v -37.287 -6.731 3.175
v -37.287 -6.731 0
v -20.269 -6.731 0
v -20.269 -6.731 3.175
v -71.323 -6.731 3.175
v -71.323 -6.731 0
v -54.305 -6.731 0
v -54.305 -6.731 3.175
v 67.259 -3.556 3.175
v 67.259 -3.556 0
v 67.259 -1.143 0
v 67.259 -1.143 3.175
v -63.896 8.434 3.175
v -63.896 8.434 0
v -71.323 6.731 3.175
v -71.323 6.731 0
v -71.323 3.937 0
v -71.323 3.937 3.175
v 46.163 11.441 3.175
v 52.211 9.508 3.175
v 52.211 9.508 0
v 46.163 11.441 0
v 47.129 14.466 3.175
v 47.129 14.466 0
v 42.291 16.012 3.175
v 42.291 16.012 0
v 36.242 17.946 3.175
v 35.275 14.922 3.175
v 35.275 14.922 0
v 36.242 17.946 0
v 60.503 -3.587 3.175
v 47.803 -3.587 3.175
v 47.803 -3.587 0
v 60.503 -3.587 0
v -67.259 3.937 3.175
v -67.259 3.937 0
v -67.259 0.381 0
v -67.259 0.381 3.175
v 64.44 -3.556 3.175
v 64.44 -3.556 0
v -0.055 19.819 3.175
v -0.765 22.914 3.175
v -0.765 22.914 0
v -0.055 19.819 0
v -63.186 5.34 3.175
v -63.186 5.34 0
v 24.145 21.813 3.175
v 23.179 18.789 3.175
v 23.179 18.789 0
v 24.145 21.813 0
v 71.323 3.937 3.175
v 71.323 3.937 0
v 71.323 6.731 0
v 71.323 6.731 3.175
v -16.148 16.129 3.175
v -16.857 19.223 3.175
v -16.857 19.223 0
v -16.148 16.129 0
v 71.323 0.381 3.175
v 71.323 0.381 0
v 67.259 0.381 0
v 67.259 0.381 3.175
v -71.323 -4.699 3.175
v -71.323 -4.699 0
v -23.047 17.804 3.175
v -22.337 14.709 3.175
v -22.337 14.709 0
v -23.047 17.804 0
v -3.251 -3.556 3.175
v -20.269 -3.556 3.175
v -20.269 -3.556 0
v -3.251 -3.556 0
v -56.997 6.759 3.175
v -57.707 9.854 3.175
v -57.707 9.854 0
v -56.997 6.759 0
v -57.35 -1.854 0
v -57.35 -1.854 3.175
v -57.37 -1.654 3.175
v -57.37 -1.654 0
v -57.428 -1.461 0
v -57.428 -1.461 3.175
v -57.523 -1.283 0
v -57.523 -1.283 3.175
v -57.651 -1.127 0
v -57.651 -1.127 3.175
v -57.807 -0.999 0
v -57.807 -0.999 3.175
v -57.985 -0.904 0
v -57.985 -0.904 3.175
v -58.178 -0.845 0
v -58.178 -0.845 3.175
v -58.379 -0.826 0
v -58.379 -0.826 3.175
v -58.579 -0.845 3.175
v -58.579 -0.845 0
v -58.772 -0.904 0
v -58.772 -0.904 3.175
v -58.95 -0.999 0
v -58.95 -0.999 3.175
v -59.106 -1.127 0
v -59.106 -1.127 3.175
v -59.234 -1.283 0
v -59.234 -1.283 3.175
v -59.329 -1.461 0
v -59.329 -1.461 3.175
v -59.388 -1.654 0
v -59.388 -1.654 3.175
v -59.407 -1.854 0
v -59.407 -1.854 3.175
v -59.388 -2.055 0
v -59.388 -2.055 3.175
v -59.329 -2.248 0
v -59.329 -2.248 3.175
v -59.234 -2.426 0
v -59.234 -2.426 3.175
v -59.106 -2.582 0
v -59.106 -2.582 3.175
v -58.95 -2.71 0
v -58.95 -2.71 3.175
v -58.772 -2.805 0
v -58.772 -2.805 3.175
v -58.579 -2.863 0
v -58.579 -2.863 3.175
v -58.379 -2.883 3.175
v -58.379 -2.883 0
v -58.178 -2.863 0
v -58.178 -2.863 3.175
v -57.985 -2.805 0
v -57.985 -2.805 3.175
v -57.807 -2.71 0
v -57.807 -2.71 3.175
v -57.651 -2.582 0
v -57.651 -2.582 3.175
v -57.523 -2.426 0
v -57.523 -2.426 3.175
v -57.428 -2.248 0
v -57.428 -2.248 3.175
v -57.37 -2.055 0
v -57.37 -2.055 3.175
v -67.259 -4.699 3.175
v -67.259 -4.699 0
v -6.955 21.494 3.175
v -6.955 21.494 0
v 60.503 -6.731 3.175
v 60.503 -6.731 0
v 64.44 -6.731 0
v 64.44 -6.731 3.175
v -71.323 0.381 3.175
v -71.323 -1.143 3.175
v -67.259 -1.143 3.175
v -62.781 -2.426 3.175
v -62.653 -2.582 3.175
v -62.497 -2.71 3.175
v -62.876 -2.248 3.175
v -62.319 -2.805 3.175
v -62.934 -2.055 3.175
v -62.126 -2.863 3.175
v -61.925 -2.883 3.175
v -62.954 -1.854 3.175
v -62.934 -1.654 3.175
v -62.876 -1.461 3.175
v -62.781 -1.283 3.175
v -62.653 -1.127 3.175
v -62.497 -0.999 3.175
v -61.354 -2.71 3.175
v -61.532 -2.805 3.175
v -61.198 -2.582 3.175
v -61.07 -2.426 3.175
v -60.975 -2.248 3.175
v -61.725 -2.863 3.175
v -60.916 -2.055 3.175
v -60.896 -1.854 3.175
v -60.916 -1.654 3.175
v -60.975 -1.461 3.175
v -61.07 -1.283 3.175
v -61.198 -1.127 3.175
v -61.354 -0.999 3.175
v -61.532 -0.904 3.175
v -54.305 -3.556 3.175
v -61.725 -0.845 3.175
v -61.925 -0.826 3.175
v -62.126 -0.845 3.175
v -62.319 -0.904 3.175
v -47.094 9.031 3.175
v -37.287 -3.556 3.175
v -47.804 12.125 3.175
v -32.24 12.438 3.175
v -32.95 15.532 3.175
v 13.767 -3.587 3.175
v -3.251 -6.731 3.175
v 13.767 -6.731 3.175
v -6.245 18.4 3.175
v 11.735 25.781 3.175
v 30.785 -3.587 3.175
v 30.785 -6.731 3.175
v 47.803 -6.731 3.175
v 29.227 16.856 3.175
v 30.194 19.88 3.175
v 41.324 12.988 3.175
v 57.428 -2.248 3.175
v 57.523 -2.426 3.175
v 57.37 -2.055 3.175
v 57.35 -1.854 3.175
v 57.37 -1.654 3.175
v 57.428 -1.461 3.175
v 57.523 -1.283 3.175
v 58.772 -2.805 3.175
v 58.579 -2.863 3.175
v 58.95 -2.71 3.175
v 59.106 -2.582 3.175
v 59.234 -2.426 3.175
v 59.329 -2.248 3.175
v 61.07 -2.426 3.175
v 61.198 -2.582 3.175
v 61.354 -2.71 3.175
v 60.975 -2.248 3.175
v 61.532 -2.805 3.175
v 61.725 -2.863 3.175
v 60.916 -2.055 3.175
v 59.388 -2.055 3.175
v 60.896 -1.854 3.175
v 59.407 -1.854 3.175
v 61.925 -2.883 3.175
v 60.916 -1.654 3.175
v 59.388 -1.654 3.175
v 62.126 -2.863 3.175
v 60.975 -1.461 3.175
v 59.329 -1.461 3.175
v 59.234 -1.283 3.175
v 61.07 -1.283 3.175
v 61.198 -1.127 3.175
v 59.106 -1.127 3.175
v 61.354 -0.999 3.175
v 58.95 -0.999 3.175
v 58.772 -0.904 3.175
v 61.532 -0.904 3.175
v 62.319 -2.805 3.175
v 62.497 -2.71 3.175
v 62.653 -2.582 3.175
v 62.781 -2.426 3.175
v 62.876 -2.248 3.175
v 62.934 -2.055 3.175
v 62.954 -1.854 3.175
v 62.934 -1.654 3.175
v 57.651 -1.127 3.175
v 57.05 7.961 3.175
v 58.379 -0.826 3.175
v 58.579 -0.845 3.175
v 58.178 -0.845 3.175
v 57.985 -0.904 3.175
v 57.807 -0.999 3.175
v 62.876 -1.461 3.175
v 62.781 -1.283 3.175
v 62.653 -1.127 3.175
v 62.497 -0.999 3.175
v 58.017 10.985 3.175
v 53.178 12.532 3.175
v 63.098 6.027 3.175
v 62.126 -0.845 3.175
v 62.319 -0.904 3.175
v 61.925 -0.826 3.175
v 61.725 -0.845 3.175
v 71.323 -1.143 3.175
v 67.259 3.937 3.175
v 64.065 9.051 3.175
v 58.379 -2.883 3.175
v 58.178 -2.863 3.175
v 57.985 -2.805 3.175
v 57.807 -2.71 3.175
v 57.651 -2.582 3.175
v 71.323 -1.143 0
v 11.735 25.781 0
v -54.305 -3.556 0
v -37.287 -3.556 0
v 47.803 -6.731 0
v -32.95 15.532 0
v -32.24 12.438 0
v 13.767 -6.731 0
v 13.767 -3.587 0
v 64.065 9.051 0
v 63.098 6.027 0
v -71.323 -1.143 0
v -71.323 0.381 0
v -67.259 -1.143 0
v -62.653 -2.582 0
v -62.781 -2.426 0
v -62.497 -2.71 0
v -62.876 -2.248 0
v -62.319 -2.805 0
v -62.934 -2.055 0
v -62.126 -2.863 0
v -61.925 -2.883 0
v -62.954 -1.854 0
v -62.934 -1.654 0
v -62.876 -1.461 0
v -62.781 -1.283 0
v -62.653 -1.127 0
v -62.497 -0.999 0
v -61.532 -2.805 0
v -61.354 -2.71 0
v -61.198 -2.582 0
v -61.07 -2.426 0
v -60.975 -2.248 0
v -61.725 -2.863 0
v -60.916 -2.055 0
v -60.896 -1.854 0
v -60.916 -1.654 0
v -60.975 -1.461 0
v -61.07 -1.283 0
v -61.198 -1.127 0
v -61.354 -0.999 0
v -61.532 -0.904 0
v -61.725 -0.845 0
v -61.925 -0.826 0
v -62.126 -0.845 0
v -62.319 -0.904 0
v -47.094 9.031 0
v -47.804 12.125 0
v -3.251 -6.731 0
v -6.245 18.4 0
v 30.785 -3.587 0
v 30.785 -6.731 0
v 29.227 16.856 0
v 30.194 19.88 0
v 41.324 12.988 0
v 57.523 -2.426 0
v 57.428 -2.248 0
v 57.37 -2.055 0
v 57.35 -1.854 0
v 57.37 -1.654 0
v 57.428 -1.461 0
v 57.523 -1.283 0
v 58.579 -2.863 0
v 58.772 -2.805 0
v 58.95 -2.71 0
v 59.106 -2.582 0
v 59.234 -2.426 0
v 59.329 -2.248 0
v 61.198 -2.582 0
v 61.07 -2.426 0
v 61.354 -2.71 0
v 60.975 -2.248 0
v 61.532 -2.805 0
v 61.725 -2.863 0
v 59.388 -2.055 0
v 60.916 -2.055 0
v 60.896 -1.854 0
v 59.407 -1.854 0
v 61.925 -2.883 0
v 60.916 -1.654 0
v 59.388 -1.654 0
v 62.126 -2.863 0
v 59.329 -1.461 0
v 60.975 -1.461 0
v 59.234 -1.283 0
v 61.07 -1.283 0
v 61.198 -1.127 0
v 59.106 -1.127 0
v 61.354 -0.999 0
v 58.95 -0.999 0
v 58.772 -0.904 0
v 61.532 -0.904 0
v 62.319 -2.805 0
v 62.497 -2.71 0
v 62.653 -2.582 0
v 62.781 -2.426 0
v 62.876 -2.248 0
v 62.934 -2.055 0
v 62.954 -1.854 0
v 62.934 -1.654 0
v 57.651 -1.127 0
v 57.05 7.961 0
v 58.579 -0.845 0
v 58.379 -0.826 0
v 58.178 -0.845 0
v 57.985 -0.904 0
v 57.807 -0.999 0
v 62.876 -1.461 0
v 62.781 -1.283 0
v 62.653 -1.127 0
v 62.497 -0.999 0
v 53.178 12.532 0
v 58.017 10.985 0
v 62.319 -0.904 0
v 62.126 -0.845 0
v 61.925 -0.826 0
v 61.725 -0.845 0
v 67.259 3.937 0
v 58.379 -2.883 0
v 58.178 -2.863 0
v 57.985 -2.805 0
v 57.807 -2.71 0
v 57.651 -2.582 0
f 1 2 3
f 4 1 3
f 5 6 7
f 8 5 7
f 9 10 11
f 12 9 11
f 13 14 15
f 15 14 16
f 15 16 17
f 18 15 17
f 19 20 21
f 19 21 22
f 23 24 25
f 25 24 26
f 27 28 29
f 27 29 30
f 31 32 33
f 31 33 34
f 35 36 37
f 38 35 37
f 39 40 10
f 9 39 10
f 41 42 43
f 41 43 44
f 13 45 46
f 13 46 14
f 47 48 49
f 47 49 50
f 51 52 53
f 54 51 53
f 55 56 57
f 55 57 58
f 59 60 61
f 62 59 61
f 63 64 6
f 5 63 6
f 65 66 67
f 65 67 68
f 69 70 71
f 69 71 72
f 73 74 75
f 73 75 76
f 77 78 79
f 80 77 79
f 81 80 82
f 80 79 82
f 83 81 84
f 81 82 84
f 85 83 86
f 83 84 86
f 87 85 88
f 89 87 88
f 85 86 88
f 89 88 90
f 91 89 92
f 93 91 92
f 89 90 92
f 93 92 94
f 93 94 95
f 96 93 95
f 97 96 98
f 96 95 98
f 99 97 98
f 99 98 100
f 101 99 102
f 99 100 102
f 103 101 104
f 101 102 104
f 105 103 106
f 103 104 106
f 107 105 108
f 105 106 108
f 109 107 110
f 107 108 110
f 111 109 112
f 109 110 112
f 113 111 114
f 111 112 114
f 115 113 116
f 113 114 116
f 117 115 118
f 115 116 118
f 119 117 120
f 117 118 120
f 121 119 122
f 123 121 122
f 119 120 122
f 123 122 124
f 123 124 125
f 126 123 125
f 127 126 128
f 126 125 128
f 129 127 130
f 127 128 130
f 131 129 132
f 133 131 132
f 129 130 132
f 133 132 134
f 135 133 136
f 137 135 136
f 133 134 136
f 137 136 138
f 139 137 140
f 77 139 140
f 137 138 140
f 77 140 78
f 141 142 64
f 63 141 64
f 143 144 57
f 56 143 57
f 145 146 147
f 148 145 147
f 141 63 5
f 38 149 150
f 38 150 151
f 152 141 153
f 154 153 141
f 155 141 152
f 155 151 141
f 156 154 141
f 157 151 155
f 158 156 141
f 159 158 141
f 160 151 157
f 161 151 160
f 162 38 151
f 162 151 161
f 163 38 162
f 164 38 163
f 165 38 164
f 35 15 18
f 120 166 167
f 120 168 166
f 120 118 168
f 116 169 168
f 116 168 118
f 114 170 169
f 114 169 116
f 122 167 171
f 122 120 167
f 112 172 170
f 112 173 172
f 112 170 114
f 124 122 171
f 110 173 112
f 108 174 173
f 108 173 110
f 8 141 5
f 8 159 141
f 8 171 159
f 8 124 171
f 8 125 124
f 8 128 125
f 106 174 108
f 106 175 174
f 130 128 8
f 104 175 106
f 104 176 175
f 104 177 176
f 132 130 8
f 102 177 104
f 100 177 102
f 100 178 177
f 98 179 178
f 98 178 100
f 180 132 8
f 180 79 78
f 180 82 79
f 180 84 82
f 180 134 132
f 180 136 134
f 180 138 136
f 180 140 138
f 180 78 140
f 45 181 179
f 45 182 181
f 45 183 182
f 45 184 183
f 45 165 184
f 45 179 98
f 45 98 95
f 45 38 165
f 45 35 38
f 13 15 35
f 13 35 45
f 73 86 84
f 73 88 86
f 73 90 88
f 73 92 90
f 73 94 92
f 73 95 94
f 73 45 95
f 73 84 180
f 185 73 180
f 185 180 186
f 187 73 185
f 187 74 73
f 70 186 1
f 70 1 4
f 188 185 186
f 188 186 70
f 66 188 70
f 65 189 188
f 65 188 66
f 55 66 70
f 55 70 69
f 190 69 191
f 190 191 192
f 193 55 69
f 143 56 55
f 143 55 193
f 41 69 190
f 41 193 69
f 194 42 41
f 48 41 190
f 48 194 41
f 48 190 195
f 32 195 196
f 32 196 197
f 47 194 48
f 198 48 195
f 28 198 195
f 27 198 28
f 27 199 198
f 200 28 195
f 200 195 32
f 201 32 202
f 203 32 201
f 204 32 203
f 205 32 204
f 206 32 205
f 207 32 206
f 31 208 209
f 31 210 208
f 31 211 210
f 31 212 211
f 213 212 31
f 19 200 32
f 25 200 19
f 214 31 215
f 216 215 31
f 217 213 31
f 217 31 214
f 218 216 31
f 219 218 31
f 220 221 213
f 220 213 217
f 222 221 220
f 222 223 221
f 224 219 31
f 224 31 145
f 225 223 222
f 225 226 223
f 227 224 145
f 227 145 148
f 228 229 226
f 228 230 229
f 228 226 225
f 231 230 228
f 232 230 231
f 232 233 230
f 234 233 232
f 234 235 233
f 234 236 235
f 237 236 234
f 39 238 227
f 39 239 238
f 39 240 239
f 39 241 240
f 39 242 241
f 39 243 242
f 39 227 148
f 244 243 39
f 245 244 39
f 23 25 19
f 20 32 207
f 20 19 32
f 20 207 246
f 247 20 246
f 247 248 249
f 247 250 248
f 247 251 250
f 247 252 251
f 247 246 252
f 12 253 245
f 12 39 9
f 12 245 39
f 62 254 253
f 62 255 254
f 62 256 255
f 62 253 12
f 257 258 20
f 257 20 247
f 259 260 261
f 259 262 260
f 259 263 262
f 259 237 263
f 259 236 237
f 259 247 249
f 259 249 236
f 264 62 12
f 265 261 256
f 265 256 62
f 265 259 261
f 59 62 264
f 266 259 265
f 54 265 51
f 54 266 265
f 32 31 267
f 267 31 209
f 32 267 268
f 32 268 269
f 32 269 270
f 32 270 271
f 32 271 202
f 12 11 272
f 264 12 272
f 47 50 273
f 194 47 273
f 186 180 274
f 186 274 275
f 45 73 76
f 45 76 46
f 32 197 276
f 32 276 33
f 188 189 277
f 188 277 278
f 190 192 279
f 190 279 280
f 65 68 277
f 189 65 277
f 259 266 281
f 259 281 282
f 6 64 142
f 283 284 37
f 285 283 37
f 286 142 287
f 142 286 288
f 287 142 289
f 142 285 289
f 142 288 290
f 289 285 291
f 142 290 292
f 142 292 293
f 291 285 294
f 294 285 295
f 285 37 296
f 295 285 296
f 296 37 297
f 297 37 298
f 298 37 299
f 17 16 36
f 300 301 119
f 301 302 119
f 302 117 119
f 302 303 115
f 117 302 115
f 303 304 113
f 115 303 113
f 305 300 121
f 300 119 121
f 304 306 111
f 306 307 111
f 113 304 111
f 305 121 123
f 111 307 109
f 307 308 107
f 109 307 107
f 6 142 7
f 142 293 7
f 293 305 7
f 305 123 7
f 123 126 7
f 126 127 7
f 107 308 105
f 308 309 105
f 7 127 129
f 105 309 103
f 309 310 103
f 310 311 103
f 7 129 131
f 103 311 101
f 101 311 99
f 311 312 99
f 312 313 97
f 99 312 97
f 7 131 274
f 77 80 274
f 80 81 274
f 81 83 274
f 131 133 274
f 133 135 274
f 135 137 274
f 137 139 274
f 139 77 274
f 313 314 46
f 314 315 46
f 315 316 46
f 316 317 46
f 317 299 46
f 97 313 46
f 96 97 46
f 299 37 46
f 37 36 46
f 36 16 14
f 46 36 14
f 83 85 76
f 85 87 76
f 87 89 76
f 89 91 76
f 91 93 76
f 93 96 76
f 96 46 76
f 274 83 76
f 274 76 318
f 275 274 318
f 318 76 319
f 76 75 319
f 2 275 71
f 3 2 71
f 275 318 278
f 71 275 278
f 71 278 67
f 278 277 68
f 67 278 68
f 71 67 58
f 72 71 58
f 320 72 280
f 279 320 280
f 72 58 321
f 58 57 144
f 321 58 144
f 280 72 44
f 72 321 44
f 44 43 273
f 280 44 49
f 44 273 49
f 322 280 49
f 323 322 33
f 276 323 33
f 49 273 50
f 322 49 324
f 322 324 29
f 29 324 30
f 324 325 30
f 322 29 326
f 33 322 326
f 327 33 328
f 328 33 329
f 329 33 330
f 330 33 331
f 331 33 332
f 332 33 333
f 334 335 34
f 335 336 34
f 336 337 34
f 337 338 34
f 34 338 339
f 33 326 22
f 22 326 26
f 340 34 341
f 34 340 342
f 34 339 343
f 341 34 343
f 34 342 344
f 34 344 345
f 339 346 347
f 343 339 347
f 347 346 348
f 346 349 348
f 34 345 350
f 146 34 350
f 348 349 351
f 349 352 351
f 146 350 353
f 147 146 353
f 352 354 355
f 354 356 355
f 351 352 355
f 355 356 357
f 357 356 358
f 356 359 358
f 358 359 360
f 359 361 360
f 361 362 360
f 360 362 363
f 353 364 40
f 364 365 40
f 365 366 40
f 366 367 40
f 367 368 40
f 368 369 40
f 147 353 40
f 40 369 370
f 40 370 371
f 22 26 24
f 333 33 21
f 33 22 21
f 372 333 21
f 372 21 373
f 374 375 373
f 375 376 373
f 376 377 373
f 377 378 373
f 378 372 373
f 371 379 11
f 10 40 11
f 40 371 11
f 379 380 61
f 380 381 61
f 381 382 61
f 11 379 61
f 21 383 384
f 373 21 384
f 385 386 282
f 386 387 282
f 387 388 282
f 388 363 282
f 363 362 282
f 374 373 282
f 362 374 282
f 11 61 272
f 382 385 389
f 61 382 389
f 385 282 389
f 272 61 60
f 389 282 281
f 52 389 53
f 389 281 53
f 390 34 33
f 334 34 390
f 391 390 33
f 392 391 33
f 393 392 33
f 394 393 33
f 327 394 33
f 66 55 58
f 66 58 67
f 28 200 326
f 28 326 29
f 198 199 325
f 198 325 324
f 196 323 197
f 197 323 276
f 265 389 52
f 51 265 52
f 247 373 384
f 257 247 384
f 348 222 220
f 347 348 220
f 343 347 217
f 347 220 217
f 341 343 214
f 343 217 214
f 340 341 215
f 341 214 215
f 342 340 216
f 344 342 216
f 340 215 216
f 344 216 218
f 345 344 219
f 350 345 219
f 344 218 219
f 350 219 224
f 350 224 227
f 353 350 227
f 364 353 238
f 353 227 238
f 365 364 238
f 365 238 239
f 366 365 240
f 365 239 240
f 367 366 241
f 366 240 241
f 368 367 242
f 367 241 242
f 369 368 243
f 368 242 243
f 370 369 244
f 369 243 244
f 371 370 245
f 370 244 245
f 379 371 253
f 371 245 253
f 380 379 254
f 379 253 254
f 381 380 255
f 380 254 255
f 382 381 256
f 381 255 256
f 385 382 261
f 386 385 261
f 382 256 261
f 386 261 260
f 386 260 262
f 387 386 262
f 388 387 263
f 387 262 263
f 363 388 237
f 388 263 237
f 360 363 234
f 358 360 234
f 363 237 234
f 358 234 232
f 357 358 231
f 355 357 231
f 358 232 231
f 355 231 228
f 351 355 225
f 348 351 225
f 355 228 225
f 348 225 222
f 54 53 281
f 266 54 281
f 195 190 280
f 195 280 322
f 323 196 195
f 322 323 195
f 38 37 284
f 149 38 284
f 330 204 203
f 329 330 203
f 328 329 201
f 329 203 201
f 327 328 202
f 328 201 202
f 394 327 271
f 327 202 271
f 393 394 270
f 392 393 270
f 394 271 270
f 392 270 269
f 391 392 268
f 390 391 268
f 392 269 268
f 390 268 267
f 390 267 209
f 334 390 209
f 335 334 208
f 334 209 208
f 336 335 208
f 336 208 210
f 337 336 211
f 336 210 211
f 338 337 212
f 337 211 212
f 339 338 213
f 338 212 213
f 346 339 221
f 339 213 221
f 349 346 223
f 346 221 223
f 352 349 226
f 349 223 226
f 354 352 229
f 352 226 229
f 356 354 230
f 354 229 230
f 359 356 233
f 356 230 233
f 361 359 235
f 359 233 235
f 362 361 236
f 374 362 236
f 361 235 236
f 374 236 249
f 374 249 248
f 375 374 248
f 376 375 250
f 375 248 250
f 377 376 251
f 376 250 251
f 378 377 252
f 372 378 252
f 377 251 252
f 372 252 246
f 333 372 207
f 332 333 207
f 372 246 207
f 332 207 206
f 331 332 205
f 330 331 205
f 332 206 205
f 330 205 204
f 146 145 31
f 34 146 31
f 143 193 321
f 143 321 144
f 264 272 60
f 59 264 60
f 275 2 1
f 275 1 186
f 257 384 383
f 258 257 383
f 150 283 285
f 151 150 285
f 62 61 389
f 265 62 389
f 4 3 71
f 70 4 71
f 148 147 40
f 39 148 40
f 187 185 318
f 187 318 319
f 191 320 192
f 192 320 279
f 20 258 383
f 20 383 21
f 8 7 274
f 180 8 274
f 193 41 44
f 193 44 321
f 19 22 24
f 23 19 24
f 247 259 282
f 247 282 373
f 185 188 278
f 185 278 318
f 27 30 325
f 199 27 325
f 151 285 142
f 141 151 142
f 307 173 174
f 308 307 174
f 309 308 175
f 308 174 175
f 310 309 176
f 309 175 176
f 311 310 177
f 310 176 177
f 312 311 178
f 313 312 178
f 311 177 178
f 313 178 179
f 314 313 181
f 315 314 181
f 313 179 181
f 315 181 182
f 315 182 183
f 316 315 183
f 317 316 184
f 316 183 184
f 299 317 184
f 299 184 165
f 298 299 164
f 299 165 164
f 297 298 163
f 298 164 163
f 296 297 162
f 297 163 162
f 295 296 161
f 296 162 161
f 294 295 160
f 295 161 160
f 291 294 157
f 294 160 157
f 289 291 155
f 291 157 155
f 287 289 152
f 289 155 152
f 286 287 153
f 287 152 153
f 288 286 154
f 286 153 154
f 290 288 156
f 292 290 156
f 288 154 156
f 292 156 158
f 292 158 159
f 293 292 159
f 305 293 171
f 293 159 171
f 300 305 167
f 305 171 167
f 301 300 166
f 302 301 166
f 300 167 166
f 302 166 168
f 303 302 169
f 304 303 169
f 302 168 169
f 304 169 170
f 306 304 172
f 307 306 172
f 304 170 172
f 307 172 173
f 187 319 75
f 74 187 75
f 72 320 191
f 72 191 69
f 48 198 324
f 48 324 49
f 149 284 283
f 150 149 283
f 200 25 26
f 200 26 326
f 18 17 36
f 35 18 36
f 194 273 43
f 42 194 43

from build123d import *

# Parameters (mm, degrees)
BOSS_EXTRUDE1_DEPTH = 3.175
SKETCH4_W           = 17.018
SKETCH4_H           = 3.175
SKETCH4_H_2         = 3.144138513
SKETCH4_W_2         = 3.937
SKETCH4_W_3         = 12.7
CUT_EXTRUDE1_DEPTH  = 3.175
SKETCH5_W           = 7.516860114
SKETCH5_H           = 3.175
CUT_EXTRUDE2_DEPTH  = 3.175
SKETCH6_R           = 1.0287
CUT_EXTRUDE3_DEPTH  = 3.175
CUT_EXTRUDE4_DEPTH  = 4.064


with BuildPart() as part:
    # Sketch2 → Boss-Extrude1 (new body)
    with BuildSketch(Plane.XY):
        Polygon((-71.3232, 6.731), (11.7348, 6.731), (11.7348, 25.781), align=None)
        Polygon((11.7348, 25.781), (11.7348, 6.731), (71.3232, 6.731), align=None)
        Polygon((11.7348, 6.731), (11.7348, -6.731), (71.3232, -6.731), (71.3232, -4.699), (67.2592, -4.699), (67.2592, -1.143), (71.3232, -1.143), (71.3232, 0.381), (67.2592, 0.381), (67.2592, 3.937), (71.3232, 3.937), (71.3232, 4.572927428), (71.3232, 6.731), align=None)
        Polygon((-71.3232, -6.731), (11.7348, -6.731), (11.7348, 6.731), (-71.3232, 6.731), (-71.3232, 3.937), (-67.2592, 3.937), (-67.2592, 0.381), (-71.3232, 0.381), (-71.3232, -1.143), (-67.2592, -1.143), (-67.2592, -4.699), (-71.3232, -4.699), align=None)
    extrude(amount=BOSS_EXTRUDE1_DEPTH)

    # Sketch4 → Cut-Extrude1 (cut)
    with BuildSketch(Plane.XY.offset(3.175)):
        with Locations((-45.7962, -5.1435)):
            Rectangle(SKETCH4_W, SKETCH4_H)
        with Locations((-11.7602, -5.1435)):
            Rectangle(SKETCH4_W, SKETCH4_H)
        with Locations((22.2758, -5.158930744)):
            Rectangle(SKETCH4_W, SKETCH4_H_2)
        with Locations((75.1713, -5.1435)):
            Rectangle(SKETCH4_W_2, SKETCH4_H)
        with Locations((54.1528, -5.158930744)):
            Rectangle(SKETCH4_W_3, SKETCH4_H_2)
    extrude(amount=-CUT_EXTRUDE1_DEPTH, mode=Mode.SUBTRACT)

    # Sketch5 → Cut-Extrude2 (cut)
    with BuildSketch(Plane.XY.offset(3.175)):
        with Locations((68.198230057, -5.1435)):
            Rectangle(SKETCH5_W, SKETCH5_H)
    extrude(amount=-CUT_EXTRUDE2_DEPTH, mode=Mode.SUBTRACT)

    # Sketch6 → Cut-Extrude3 (cut)
    with BuildSketch(Plane.XY.offset(3.175)):
        with Locations((-61.9252, -1.8542)):
            Circle(SKETCH6_R)
        with Locations((-58.378607788, -1.8542)):
            Circle(SKETCH6_R)
        with Locations(Location((61.9252, -1.8542, 0), (0, 0, 180))):
            Circle(SKETCH6_R)
        with Locations(Location((58.378607788, -1.8542, 0), (0, 0, 180))):
            Circle(SKETCH6_R)
    extrude(amount=-CUT_EXTRUDE3_DEPTH, mode=Mode.SUBTRACT)

    # Sketch7 → Cut-Extrude4 (cut)
    with BuildSketch(Plane.XY.offset(3.175)):
        Polygon((-63.896048939, 8.434475014), (-57.706756389, 9.854037525), (-56.996975133, 6.75939125), (-63.186267684, 5.339828739), align=None)
        Polygon((-47.803888308, 12.125337544), (-32.949586187, 15.532287572), (-32.239804931, 12.437641297), (-47.094107052, 9.030691269), align=None)
        Polygon((-23.046718106, 17.80358759), (-16.857425556, 19.223150102), (-16.1476443, 16.128503827), (-22.33693685, 14.708941315), align=None)
        Polygon((-6.954557475, 21.49445012), (-0.765264924, 22.914012632), (-0.055483668, 19.819366357), (-6.244776219, 18.399803845), align=None)
        Polygon((24.145430883, 21.813407007), (30.193862821, 19.879765083), (29.227041859, 16.855549114), (23.178609921, 18.789191038), align=None)
        Polygon((36.242294759, 17.946123159), (42.290726697, 16.012481235), (41.323905735, 12.988265266), (35.275473797, 14.92190719), align=None)
        Polygon((47.129472248, 14.465567696), (53.177904186, 12.531925772), (52.211083224, 9.507709803), (46.162651286, 11.441351727), align=None)
        Polygon((58.016649736, 10.985012233), (64.065081674, 9.051370309), (63.098260712, 6.02715434), (57.049828774, 7.960796264), align=None)
    extrude(amount=-CUT_EXTRUDE4_DEPTH, mode=Mode.SUBTRACT)


solid = part.part
